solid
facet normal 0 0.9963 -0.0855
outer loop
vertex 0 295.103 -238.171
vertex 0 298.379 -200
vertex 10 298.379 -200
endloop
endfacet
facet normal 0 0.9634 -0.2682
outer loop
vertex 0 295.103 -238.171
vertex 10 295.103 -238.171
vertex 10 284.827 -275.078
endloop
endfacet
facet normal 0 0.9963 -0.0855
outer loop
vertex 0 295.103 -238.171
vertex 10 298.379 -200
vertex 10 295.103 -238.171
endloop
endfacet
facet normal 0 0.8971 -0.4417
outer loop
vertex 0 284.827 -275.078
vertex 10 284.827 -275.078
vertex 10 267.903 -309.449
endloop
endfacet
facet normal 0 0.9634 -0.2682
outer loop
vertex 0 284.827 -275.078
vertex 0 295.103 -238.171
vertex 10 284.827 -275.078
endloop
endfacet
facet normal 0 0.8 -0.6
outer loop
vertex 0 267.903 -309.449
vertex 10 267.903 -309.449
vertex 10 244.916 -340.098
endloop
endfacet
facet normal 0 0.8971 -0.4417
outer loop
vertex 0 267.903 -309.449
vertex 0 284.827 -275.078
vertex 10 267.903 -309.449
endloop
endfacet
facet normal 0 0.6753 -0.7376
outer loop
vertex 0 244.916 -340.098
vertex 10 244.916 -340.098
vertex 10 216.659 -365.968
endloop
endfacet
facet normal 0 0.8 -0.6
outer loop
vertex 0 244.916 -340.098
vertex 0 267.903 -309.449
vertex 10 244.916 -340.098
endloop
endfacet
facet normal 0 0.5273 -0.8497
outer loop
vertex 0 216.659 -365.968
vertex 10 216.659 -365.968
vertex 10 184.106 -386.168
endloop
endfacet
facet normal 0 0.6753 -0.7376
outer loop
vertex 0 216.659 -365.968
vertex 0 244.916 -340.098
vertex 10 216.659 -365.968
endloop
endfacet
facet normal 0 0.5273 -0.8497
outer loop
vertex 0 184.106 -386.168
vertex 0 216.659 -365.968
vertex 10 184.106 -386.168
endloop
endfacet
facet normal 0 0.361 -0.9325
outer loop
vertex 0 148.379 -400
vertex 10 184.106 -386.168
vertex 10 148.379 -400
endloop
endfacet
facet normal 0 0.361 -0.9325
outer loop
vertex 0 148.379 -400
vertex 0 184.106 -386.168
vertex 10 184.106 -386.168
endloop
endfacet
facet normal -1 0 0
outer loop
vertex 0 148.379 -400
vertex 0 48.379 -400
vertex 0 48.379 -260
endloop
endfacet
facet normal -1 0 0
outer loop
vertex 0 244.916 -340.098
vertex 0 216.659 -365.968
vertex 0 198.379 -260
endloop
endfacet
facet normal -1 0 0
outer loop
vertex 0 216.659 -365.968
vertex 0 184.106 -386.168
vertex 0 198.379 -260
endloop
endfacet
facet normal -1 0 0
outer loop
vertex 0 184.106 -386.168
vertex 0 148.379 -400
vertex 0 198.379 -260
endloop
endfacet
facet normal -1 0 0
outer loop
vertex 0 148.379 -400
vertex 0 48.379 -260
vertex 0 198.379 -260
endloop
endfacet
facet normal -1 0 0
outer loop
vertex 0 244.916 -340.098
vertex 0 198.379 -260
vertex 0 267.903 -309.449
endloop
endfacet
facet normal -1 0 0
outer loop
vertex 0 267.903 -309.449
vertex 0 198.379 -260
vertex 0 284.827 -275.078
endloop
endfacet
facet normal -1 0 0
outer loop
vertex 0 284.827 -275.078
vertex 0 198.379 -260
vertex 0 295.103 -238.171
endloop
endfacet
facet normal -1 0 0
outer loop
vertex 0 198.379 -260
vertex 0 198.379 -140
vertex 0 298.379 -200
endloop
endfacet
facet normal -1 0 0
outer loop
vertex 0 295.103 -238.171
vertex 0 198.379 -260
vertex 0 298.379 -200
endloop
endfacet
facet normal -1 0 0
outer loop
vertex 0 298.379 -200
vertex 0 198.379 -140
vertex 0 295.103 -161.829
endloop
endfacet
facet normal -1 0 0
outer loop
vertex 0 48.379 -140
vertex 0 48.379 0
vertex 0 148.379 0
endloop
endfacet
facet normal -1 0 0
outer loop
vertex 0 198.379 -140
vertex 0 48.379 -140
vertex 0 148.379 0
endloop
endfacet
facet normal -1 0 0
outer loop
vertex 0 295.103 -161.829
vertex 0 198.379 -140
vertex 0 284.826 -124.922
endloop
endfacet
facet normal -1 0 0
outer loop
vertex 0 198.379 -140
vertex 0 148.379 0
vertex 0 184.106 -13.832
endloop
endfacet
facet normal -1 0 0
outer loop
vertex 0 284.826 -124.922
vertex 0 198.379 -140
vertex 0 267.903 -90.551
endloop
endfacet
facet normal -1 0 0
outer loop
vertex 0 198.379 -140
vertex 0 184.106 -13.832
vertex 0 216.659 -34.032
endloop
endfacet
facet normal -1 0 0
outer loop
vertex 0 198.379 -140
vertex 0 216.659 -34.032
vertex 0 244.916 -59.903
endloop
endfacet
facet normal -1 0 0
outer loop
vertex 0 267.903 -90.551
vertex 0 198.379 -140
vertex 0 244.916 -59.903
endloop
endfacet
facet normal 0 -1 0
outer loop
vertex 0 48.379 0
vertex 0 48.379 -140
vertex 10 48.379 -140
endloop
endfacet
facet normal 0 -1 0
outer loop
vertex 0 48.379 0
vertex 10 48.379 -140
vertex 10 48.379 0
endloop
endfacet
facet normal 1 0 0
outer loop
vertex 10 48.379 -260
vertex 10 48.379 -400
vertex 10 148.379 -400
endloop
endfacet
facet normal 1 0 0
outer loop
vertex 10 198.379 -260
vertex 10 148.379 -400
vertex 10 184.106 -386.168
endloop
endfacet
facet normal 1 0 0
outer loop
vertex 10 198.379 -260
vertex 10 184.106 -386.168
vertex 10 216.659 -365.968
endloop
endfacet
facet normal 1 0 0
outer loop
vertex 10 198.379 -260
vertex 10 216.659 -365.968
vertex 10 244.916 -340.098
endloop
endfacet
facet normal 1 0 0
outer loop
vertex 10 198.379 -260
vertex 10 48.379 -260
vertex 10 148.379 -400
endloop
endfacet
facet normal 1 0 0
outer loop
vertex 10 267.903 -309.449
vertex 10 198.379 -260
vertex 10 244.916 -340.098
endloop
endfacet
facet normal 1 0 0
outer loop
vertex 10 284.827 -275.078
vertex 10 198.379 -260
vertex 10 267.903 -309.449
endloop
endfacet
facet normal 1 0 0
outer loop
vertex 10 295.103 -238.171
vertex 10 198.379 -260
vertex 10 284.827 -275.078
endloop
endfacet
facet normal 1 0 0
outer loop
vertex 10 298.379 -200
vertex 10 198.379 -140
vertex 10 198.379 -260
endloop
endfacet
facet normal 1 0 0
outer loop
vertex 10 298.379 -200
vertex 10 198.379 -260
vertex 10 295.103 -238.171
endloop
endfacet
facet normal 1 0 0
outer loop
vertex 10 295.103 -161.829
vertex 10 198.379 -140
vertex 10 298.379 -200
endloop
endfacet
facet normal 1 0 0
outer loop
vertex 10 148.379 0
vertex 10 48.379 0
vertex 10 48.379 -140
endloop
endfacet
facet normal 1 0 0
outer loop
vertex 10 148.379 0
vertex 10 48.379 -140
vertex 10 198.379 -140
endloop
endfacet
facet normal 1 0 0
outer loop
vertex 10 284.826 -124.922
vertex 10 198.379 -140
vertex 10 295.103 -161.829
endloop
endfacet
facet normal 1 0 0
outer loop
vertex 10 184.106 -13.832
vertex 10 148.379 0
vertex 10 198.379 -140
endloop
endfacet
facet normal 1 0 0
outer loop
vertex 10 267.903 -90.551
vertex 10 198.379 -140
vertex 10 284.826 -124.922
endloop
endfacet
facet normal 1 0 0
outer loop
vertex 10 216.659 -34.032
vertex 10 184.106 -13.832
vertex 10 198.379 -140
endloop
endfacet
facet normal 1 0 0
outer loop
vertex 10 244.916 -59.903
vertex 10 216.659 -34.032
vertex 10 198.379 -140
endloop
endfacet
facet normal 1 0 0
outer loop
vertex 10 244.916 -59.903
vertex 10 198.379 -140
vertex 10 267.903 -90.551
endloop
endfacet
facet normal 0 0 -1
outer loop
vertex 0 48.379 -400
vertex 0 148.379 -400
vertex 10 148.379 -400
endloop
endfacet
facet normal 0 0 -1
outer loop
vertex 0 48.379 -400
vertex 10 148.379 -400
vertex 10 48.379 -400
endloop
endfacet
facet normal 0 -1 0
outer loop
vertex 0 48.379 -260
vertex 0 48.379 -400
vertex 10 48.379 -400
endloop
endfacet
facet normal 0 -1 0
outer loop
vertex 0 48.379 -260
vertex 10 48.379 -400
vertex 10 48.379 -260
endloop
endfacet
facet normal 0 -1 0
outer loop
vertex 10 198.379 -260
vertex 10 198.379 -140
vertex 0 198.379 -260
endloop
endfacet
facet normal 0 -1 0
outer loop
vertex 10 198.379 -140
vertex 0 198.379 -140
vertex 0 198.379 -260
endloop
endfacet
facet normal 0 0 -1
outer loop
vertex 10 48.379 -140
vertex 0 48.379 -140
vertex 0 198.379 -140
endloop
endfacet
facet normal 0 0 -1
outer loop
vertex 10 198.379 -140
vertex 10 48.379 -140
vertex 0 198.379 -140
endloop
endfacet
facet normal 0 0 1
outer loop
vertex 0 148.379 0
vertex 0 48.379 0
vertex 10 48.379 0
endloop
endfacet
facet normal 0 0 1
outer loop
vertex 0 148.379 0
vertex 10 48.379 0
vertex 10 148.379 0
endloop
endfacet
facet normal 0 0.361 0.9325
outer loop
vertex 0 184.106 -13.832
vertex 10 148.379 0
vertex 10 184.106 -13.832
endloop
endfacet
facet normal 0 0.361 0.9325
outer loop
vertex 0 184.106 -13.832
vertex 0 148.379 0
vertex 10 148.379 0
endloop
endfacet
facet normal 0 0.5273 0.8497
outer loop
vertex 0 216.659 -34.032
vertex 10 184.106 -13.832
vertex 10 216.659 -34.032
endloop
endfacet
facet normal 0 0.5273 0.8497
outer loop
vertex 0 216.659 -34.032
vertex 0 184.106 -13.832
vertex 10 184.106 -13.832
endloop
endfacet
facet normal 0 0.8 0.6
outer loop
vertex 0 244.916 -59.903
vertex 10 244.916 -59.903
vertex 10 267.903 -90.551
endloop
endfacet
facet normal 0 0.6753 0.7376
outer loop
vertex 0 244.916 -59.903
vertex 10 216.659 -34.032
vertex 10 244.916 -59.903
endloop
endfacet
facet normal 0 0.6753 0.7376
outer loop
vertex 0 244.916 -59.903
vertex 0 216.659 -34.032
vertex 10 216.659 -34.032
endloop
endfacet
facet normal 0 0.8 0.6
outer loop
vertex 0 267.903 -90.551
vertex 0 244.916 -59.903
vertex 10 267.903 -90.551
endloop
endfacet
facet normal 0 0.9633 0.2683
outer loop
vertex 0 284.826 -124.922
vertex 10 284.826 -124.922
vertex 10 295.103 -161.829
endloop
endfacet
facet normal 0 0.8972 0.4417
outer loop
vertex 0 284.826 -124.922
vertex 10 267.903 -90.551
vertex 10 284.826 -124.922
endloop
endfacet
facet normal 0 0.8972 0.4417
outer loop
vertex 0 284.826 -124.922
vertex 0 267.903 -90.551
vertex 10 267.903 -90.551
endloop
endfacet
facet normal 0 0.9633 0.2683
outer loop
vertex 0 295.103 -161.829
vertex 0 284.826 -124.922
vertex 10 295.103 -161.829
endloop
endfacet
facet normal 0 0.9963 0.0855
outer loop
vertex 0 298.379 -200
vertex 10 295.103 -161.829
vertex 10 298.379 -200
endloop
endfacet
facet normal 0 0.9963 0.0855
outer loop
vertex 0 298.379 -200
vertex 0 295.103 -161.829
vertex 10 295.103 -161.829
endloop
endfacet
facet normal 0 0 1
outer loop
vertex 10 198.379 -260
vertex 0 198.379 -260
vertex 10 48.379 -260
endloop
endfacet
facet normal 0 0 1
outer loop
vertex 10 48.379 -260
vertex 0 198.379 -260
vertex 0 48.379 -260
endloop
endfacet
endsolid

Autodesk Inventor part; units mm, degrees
ref_plane "YZ Plane" through (0, 0, 0) normal (1, 0, 0) x (0, 1, 0)
ref_plane "XZ Plane" through (0, 0, 0) normal (0, 1, 0) x (-1, 0, 0)
ref_plane "XY Plane" through (0, 0, 0) normal (0, 0, 1) x (1, 0, 0)
sketch "Sketch1" plane through (0, 0, 0) normal (1, 0, 0) x (0, 1, 0)
  line L0 (48.3789, 0) -> (148.3789, 0)
  line L1 (248.3789, -333.1357) -> (248.3789, -336.1798)
  line L2 (148.3789, -400) -> (48.3789, -400)
  line L3 (48.3789, -400) -> (48.3789, 0)
  line L4 (198.3789, -260) -> (48.3789, -260)
  line L5 (48.3789, -260) -> (48.3789, -140)
  line L6 (48.3789, -140) -> (198.3789, -140)
  line L7 (198.3789, -140) -> (198.3789, -260)
  line L8 (-98.7773, -200) -> (409.3156, -200)
  arc A0 (298.3789, -200) -> (148.3789, 0) centre (92.075, -198.478) ccw
  arc A1 (148.3789, -400) -> (298.3789, -200) centre (92.075, -201.522) ccw
  point P0 (248.3789, -63.8202)
  point P1 (248.3789, -200)
  dimension "d11" = 120
  dimension "d12" = 150
  dimension "d13" = 50
  dimension "d14" = 140
  dimension "d18" = 200
  dimension "d19" = 200
  dimension "d20" = 50
  dimension "d21" = 100
  dimension "d23" = 400
extrude "Extrusion1" add sketch "Sketch1" along normal blind 10 contours L0 A0 L8 L7 L6 L3 | A1 L2 L3 L4 L7 L8
properties part number "beam"
